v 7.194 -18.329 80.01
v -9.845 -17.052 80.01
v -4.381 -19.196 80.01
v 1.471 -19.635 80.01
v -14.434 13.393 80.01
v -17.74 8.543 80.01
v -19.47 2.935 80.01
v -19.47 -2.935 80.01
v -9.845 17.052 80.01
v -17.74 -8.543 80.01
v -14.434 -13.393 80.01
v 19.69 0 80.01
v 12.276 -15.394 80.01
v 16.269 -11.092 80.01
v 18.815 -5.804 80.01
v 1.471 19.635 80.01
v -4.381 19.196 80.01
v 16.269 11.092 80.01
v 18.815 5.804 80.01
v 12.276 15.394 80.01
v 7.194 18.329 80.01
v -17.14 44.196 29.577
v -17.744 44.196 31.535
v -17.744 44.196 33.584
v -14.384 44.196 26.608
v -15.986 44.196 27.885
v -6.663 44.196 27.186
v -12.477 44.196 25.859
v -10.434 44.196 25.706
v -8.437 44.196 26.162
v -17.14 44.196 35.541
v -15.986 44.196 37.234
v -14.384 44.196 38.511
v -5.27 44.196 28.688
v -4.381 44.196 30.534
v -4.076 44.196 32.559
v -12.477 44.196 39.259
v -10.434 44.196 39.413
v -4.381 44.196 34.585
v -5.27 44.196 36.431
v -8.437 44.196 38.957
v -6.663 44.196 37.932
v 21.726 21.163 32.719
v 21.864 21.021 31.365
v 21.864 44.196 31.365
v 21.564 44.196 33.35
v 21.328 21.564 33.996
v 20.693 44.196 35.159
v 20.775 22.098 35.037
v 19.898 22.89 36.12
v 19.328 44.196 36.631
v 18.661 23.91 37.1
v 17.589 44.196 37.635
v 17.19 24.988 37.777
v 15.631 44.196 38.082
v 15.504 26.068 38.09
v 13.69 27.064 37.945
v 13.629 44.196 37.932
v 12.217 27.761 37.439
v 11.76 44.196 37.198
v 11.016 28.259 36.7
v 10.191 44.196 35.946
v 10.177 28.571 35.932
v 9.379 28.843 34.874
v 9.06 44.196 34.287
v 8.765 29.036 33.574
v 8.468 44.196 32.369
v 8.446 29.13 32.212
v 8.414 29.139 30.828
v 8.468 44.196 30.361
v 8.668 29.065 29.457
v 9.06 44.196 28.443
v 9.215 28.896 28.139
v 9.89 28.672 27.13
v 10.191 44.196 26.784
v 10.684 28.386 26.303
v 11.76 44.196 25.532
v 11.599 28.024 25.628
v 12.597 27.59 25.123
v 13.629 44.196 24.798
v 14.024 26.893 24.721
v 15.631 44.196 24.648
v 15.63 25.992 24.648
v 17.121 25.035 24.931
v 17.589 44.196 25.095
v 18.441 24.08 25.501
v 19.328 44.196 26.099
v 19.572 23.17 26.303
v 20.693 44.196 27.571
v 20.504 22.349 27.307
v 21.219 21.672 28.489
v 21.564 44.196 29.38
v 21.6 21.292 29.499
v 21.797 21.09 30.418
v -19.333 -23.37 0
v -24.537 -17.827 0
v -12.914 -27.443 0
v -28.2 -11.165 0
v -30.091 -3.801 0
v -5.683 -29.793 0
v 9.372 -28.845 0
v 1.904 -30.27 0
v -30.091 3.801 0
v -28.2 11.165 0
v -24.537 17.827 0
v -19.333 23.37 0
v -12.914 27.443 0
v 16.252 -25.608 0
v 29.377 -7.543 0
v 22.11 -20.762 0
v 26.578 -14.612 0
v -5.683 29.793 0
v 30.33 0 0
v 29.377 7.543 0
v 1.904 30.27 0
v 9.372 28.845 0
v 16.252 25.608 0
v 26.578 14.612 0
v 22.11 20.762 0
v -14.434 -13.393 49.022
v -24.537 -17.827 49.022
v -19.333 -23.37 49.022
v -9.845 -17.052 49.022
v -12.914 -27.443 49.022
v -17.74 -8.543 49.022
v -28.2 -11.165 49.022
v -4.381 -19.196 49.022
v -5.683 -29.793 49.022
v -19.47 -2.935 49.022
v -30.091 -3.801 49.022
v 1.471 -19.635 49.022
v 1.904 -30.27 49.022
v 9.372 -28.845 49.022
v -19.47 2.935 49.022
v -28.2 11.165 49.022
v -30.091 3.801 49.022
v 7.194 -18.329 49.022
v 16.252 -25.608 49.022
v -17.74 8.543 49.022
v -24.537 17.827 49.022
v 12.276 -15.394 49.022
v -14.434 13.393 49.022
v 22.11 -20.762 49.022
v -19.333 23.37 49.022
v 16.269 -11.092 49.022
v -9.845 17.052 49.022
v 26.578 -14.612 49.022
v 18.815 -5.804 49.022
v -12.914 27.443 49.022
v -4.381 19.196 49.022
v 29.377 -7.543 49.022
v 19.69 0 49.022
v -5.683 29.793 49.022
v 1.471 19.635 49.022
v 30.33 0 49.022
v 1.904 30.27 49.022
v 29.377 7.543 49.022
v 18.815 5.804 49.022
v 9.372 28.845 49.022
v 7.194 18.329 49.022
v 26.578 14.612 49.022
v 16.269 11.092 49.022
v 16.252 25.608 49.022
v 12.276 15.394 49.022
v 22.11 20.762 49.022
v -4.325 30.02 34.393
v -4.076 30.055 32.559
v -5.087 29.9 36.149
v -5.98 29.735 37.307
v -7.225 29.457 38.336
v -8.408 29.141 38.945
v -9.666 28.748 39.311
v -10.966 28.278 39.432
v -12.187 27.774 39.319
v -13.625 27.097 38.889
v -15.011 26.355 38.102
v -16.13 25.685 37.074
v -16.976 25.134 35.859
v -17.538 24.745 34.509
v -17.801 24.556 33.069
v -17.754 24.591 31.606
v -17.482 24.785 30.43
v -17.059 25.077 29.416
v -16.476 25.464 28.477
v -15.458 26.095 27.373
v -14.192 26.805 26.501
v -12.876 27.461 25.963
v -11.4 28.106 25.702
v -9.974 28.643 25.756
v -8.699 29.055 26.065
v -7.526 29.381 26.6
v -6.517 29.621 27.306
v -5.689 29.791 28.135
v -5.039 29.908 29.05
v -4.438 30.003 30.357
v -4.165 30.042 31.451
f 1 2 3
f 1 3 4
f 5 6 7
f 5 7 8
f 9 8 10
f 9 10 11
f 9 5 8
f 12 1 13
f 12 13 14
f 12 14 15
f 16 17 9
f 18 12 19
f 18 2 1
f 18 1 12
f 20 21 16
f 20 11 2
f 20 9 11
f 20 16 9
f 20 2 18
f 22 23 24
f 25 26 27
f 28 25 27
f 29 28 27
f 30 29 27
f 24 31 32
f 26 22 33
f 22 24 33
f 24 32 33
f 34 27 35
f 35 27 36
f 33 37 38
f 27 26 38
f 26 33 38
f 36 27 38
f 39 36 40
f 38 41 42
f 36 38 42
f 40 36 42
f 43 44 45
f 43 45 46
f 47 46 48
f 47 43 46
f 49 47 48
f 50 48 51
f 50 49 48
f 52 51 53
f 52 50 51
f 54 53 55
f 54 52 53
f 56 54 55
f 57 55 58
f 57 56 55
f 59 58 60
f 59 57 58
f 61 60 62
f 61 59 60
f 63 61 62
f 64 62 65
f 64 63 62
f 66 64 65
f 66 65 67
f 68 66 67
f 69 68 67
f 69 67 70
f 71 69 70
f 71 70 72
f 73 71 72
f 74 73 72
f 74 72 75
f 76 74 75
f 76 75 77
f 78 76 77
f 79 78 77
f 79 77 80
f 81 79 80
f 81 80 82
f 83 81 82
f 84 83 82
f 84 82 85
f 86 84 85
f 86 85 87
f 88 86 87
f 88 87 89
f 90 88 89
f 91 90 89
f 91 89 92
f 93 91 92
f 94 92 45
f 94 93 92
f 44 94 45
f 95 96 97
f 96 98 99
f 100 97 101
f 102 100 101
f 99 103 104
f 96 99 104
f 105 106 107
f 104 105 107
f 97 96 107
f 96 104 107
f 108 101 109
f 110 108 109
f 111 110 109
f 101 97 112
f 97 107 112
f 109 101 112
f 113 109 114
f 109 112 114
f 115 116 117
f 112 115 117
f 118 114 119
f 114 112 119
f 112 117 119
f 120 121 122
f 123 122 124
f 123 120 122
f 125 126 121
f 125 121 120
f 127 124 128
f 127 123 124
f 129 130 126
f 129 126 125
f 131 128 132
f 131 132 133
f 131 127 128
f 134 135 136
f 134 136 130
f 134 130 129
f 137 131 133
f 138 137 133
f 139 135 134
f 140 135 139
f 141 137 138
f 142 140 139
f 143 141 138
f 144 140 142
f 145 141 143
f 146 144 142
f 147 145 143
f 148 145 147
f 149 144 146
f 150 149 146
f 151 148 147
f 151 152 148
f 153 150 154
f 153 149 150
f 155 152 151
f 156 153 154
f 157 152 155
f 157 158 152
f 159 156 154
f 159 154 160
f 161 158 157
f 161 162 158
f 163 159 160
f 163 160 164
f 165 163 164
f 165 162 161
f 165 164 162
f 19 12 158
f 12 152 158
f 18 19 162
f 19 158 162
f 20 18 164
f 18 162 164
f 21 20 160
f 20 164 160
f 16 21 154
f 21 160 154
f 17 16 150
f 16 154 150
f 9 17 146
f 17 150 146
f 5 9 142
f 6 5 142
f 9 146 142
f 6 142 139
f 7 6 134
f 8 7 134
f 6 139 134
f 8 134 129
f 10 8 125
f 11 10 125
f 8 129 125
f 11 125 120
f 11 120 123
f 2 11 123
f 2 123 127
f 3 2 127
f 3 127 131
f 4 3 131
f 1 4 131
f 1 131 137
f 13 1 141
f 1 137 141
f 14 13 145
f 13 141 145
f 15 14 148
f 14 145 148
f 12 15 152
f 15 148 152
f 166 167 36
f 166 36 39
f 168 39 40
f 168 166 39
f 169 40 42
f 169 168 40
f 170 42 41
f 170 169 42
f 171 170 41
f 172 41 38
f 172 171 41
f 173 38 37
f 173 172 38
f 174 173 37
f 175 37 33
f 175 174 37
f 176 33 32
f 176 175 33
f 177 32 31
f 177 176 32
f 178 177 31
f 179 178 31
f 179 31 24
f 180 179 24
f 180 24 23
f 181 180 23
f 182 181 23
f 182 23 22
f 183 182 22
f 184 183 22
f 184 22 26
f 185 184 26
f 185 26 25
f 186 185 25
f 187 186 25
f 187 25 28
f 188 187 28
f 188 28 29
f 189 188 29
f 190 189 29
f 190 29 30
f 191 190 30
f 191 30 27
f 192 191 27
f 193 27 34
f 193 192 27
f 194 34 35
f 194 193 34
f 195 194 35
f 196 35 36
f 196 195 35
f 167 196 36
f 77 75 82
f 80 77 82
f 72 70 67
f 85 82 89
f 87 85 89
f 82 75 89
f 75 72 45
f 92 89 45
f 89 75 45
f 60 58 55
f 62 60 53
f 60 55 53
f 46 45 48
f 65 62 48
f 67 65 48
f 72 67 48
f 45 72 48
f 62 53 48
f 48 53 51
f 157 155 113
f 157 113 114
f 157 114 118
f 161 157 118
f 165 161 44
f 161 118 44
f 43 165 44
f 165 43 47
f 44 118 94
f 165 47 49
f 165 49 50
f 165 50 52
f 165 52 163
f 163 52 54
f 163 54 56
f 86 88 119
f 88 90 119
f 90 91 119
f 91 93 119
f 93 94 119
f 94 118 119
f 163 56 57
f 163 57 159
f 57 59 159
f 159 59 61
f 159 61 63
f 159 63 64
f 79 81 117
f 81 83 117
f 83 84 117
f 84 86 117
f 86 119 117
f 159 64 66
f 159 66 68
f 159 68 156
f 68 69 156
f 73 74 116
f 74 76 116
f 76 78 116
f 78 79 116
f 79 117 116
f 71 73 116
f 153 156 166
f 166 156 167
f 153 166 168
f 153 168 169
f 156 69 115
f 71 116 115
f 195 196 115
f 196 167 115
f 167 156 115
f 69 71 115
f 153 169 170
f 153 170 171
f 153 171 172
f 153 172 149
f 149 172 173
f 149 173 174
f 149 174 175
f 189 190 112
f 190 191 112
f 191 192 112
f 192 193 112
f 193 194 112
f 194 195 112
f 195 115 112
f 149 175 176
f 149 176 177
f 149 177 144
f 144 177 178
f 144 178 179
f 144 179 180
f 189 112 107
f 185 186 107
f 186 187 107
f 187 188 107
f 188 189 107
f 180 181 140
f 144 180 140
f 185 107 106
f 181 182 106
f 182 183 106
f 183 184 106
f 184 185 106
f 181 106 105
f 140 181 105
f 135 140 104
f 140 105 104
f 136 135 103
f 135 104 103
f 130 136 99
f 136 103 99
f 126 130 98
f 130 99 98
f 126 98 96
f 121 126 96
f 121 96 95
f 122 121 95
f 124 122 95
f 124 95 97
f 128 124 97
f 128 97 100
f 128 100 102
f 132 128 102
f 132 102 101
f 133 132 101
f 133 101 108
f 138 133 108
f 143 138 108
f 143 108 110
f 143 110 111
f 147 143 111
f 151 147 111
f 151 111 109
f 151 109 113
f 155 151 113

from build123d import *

# Parameters (mm, degrees)
F0_R      = 30.329885
F1_DEPTH  = 49.022
F2_R      = 19.689856
F3_DEPTH  = 80.01
F4_R      = 6.735559
F4_R_2    = 6.872412
F5_DEPTH  = 44.196
F3_FACE_R = 19.689856
F6_DEPTH  = 6.604


with BuildPart() as f1:
    # F0 (on Top) → F1 (new body)
    with BuildSketch(Plane.XY):
        Circle(F0_R)
    extrude(amount=F1_DEPTH)

    # F2 (on Top) → F3 (join)
    with BuildSketch(Plane.XY):
        Circle(F2_R)
    extrude(amount=F3_DEPTH)

    # F4 (on Front) → F5 (join)
    with BuildSketch(Plane.XZ):
        with Locations((15.128103, 31.364992)):
            Circle(F4_R)
        with Locations((-10.947968, 32.559317)):
            Circle(F4_R_2)
    extrude(amount=-F5_DEPTH)

    # F3_face (on face) → F6 (join)
    with BuildSketch(Plane.XY.offset(80.01)):
        Circle(F3_FACE_R)
    extrude(amount=-F6_DEPTH)


solid = f1.part
